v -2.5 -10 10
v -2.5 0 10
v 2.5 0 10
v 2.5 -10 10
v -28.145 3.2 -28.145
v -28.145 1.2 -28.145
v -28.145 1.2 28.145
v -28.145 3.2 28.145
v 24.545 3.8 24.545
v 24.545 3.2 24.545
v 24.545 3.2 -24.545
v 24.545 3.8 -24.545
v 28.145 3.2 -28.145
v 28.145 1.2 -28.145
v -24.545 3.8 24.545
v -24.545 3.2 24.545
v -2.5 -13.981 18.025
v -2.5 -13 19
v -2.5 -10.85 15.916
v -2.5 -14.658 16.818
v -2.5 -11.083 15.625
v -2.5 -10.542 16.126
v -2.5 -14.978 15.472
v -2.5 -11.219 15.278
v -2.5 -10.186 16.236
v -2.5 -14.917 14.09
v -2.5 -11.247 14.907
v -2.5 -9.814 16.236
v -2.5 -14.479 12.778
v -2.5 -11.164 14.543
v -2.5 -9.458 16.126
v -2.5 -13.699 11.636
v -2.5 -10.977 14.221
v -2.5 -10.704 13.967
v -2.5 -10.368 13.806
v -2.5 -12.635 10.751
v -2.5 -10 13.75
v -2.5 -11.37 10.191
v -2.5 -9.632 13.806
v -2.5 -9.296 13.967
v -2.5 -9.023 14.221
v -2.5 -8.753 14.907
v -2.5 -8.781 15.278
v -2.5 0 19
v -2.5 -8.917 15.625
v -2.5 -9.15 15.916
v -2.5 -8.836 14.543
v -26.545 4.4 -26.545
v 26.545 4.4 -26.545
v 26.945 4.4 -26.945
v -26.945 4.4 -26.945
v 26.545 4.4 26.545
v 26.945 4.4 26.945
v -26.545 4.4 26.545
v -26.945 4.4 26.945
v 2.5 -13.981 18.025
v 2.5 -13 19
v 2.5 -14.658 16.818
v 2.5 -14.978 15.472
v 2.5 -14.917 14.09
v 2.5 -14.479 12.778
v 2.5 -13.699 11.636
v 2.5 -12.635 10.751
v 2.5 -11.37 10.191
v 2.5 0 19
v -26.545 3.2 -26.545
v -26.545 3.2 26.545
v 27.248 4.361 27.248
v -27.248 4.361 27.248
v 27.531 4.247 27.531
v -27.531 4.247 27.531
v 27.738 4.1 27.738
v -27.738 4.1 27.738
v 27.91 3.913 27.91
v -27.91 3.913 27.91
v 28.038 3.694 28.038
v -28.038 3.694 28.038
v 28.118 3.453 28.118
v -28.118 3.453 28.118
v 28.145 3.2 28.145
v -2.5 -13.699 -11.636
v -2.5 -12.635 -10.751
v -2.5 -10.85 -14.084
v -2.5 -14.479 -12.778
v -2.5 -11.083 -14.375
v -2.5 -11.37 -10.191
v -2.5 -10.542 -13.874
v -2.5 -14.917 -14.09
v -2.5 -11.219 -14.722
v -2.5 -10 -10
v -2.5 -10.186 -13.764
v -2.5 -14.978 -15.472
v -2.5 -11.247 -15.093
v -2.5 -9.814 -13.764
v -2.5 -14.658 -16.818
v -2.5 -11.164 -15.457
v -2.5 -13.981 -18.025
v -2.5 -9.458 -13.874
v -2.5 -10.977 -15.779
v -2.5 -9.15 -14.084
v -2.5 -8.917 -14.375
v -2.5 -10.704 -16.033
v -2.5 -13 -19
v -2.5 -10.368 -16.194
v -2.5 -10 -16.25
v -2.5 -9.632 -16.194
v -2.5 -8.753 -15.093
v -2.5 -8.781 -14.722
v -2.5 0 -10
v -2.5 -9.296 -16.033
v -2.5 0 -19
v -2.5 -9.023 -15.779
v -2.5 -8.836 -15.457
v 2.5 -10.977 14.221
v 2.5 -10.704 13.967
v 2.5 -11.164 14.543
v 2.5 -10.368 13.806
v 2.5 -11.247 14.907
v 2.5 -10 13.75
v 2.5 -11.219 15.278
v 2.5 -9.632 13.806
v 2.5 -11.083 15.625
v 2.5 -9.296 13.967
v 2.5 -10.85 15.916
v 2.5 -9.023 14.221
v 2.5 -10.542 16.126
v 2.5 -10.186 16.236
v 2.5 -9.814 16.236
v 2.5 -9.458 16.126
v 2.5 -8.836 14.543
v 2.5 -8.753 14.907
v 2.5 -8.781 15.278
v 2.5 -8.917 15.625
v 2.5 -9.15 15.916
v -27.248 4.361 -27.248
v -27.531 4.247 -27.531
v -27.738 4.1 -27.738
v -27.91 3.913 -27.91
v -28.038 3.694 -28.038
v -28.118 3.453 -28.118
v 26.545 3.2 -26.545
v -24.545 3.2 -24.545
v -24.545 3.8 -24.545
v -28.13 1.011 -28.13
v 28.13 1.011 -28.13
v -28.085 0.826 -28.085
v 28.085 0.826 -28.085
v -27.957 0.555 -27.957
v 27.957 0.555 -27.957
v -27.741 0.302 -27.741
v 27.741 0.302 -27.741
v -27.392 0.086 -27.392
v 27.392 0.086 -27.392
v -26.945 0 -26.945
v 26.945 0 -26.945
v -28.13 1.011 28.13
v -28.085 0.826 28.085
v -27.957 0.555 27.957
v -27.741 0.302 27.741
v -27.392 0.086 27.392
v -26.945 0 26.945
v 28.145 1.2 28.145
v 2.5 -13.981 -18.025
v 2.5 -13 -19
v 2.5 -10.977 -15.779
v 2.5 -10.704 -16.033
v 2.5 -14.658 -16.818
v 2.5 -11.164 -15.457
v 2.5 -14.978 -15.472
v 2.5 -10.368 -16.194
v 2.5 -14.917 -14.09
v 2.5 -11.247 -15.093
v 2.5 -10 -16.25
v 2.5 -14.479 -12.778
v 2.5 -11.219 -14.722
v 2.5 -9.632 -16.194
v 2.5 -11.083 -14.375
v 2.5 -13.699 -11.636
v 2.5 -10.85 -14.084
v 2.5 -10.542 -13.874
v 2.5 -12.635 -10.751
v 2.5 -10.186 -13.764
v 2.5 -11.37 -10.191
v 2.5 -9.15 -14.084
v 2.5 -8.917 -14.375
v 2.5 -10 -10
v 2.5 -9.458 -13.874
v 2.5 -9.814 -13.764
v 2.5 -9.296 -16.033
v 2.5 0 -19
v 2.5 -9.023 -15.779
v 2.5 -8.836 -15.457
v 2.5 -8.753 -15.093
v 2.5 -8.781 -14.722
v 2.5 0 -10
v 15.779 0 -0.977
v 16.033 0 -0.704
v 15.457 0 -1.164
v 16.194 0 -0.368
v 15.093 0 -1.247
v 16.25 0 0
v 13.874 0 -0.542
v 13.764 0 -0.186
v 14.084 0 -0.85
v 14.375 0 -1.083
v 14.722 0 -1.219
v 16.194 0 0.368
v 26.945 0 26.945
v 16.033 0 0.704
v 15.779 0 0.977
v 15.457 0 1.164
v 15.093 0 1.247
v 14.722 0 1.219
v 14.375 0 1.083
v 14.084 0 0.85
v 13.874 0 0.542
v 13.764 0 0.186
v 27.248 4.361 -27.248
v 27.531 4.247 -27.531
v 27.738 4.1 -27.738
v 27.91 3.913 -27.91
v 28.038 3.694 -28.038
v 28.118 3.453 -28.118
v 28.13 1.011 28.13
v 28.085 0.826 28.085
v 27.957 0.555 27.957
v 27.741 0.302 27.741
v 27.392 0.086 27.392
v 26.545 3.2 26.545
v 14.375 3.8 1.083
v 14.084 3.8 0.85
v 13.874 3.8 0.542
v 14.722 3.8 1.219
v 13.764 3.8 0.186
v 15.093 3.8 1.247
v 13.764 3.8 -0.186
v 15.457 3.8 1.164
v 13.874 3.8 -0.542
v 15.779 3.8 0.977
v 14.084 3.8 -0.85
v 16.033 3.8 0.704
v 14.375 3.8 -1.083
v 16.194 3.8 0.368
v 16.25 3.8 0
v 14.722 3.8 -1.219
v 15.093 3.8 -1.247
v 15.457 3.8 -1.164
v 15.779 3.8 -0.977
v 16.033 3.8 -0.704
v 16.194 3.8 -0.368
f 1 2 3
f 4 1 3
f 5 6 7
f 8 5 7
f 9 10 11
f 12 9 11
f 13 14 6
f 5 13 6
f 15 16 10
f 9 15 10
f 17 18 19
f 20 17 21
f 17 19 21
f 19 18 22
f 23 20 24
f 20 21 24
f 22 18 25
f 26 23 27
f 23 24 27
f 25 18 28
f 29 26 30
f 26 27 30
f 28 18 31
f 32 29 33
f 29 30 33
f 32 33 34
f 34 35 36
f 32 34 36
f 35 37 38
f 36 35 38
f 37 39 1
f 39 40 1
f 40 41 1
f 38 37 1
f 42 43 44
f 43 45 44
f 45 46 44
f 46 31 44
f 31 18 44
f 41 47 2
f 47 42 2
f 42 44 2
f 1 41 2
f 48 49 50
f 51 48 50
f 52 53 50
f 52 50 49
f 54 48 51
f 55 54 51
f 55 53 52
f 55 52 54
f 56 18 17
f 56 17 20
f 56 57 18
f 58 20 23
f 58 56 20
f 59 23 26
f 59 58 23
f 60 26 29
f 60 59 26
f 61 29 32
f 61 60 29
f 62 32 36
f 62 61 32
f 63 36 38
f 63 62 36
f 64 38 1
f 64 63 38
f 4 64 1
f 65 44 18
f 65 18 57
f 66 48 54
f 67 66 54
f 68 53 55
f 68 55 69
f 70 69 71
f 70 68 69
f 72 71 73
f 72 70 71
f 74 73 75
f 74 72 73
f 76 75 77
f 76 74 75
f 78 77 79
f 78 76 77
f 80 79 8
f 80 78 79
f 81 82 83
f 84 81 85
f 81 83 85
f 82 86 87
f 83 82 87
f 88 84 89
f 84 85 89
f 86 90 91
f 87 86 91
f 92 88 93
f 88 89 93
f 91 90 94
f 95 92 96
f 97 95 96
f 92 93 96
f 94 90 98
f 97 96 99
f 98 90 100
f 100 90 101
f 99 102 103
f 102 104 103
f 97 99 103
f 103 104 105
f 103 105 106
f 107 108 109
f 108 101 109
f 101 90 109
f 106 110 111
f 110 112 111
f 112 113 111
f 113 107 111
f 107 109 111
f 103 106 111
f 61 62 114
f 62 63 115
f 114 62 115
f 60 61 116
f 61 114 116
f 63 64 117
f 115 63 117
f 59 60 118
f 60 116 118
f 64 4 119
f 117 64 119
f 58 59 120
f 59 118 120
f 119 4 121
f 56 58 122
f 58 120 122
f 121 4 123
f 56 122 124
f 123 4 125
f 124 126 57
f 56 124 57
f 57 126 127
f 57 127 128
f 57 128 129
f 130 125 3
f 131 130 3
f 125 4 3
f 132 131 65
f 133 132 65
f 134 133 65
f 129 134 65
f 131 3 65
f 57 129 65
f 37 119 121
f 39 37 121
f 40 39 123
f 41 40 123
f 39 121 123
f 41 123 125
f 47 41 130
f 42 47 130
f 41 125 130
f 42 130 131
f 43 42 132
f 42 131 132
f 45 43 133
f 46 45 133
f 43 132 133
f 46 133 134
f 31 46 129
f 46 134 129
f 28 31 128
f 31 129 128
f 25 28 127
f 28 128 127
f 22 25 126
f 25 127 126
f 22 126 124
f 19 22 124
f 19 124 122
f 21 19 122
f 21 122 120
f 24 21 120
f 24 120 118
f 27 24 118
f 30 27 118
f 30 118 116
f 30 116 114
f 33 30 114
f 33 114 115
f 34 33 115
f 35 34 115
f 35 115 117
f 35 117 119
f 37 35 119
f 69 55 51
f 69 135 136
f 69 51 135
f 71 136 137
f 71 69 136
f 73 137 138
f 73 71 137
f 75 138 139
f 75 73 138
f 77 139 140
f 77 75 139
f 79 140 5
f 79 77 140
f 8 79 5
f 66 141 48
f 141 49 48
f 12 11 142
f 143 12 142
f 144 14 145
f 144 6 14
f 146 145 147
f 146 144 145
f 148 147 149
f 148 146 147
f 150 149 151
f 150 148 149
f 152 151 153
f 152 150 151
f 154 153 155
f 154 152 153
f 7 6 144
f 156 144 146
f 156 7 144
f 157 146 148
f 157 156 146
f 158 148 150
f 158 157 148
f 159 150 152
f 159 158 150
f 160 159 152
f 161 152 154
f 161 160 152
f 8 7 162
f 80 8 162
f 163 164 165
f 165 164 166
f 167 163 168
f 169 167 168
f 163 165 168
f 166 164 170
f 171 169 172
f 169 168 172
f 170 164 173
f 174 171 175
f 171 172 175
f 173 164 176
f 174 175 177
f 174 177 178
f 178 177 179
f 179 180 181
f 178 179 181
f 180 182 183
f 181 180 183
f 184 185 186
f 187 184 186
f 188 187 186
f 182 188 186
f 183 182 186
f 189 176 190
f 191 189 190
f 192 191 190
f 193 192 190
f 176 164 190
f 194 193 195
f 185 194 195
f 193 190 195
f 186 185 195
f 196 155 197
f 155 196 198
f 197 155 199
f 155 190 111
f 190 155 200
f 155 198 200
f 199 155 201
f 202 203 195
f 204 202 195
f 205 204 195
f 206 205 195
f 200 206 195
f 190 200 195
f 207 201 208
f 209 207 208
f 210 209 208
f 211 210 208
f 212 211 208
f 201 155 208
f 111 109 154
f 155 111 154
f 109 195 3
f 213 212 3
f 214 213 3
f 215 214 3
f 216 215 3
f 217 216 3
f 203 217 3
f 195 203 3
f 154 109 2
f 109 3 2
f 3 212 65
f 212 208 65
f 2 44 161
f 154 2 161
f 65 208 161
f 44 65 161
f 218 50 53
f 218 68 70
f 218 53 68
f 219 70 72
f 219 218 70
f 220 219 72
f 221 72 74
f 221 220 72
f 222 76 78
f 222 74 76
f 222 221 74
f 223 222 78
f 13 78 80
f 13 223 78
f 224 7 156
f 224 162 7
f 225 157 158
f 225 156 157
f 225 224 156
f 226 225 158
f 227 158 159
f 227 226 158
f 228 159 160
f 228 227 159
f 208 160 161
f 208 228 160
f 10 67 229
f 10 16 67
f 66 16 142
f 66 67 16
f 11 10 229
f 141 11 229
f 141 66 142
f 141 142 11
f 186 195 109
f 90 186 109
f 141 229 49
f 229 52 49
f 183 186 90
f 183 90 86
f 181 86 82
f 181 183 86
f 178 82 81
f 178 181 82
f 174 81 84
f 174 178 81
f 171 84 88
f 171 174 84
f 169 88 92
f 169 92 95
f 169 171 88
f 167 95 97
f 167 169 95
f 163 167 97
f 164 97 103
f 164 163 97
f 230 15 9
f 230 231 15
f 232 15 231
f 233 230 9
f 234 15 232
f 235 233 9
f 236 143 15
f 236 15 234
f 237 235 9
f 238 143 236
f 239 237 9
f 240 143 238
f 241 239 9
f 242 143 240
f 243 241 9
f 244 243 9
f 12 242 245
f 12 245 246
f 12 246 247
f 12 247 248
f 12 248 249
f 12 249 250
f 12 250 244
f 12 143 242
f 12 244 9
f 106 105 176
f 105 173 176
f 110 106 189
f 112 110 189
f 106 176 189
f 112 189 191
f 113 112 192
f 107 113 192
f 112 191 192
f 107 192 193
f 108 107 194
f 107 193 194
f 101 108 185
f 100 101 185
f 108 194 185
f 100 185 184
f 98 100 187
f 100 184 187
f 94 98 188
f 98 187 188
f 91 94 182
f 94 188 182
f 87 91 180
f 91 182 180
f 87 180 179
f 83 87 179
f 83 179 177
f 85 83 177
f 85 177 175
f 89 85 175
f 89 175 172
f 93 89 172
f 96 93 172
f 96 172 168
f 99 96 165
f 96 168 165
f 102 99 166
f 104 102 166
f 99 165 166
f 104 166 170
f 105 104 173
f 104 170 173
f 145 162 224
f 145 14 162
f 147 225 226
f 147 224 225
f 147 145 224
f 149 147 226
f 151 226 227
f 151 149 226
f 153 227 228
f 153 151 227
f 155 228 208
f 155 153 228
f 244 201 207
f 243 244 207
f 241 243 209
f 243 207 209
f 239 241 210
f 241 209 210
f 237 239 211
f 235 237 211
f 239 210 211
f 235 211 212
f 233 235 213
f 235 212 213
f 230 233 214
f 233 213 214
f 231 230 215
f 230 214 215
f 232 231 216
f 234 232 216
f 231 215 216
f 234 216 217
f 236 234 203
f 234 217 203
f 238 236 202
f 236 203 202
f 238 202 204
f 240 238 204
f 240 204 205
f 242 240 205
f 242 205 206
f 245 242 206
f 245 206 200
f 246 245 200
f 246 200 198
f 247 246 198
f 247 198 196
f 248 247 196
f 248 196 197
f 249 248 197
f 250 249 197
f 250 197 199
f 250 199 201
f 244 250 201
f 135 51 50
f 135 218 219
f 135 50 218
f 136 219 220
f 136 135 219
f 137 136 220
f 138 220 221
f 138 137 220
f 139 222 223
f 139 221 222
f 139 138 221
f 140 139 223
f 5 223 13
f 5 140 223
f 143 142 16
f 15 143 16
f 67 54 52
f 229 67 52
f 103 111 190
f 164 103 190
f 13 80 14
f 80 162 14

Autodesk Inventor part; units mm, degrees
ref_plane "YZ Plane" through (0, 0, 0) normal (1, 0, 0) x (0, 1, 0)
ref_plane "XZ Plane" through (0, 0, 0) normal (0, 1, 0) x (-1, 0, 0)
ref_plane "XY Plane" through (0, 0, 0) normal (0, 0, 1) x (1, 0, 0)
sketch "스케치1" plane through (0, 0, 0) normal (0, 1, 0) x (-1, 0, 0)
  line L0 (-24.9446, -24.9446) -> (24.9446, -24.9446)
  line L1 (24.9446, -24.9446) -> (24.9446, 24.9446)
  line L2 (24.9446, 24.9446) -> (-24.9446, 24.9446)
  line L3 (-24.9446, 24.9446) -> (-24.9446, -24.9446)
  line L4 (-24.9446, -24.9446) -> (24.9446, 24.9446) construction
  line L5 (24.9446, -24.9446) -> (-24.9446, 24.9446) construction
  line L6 (-28.1446, -28.1446) -> (28.1446, -28.1446)
  line L7 (28.1446, -28.1446) -> (28.1446, 28.1446)
  line L8 (28.1446, 28.1446) -> (-28.1446, 28.1446)
  line L9 (-28.1446, 28.1446) -> (-28.1446, -28.1446)
  line L10 (-28.1446, -28.1446) -> (28.1446, 28.1446) construction
  line L11 (28.1446, -28.1446) -> (-28.1446, 28.1446) construction
  point P0 (0, 0)
  dimension "d0" = 70.554
  dimension "d1" = 3.2
extrude "돌출1" add sketch "스케치1" along normal blind 4.4 contours L3 L2 L1 L0 | L9 L8 L7 L6
sketch "스케치2" plane through (0, 4.4, 0) normal (0, 1, 0) x (1, 0, 0)
  line L0 (-28.1446, 28.1446) -> (-28.1446, -28.1446) projected
  line L1 (-28.1446, -28.1446) -> (28.1446, -28.1446) projected
  line L2 (28.1446, -28.1446) -> (28.1446, 28.1446) projected
  line L3 (28.1446, 28.1446) -> (-28.1446, 28.1446) projected
  line L4 (26.5446, 26.5446) -> (-26.5446, 26.5446)
  line L5 (-26.5446, 26.5446) -> (-26.5446, -26.5446)
  line L6 (-26.5446, -26.5446) -> (26.5446, -26.5446)
  line L7 (26.5446, -26.5446) -> (26.5446, 26.5446)
  line L8 (26.5446, 26.5446) -> (-26.5446, -26.5446) construction
  line L9 (-26.5446, 26.5446) -> (26.5446, -26.5446) construction
  line L10 (24.5446, 24.5446) -> (-24.5446, 24.5446)
  line L11 (-24.5446, 24.5446) -> (-24.5446, -24.5446)
  line L12 (-24.5446, -24.5446) -> (24.5446, -24.5446)
  line L13 (24.5446, -24.5446) -> (24.5446, 24.5446)
  line L14 (24.5446, 24.5446) -> (-24.5446, -24.5446) construction
  line L15 (-24.5446, 24.5446) -> (24.5446, -24.5446) construction
  point P0 (0, 0)
  point P1 (0, 28.1446)
  point P2 (-28.1446, 0)
  dimension "d4" = 1.6
  dimension "d5" = 2
extrude "돌출2" cut sketch "스케치2" against normal blind 1.2 contours L7 L6 L5 L4 | L13 L12 L11 L10
sketch "스케치3" plane through (0, 3.2, 0) normal (0, 1, 0) x (1, 0, 0)
  line L0 (24.5446, 24.5446) -> (-24.5446, 24.5446)
  line L1 (-24.5446, 24.5446) -> (-24.5446, -24.5446)
  line L2 (-24.5446, -24.5446) -> (24.5446, -24.5446)
  line L3 (24.5446, -24.5446) -> (24.5446, 24.5446)
  line L4 (24.5446, 24.5446) -> (-24.5446, -24.5446) construction
  line L5 (-24.5446, 24.5446) -> (24.5446, -24.5446) construction
  line L6 (-26.5446, -26.5446) -> (-26.5446, 26.5446) projected
  point P0 (0, 0)
  dimension "d8" = 2
extrude "돌출3" add sketch "스케치3" along normal blind 0.6
fillet "모깎기1" radius 1.2 8 edges at (0, 4.4, 28.1446) (28.1446, 4.4, 0) (0, 4.4, -28.1446) (-28.1446, 4.4, 0) (-28.1446, 0, 0) (0, 0, 28.1446) (28.1446, 0, 0) (0, 0, -28.1446)
sketch "스케치6" plane through (0, 0, 0) normal (0, -1, 0) x (1, 0, 0)
  line L0 (-2.5, -20) -> (2.5, -20)
  line L1 (2.5, -20) -> (2.5, -10)
  line L2 (2.5, -10) -> (-2.5, -10)
  line L3 (-2.5, -10) -> (-2.5, -20)
  line L4 (-2.5, -20) -> (2.5, -10) construction
  line L5 (2.5, -20) -> (-2.5, -10) construction
  line L6 (-2.5, 10) -> (2.5, 10)
  line L7 (2.5, 10) -> (2.5, 20)
  line L8 (2.5, 20) -> (-2.5, 20)
  line L9 (-2.5, 20) -> (-2.5, 10)
  line L10 (-2.5, 10) -> (2.5, 20) construction
  line L11 (2.5, 10) -> (-2.5, 20) construction
  point P0 (0, 0)
  point P1 (0, -15)
  point P2 (0, 15)
  dimension "d27" = 5
  dimension "d28" = 10
  dimension "d29" = 10
  dimension "d30" = 5
  dimension "d31" = 20
  dimension "d33" = 10
extrude "돌출6" add sketch "스케치6" along normal blind 10
sketch "스케치7" plane through (2.5, 0, 20) normal (1, 0, 0) x (0, 0, -1)
  line L0 (10, -10) -> (0, -10) projected
  circle A0 centre (5, -10) radius 5
  line L1 (40, -10) -> (30, -10) projected
  circle A1 centre (35, -10) radius 5
  point P0 (20, 0)
extrude "돌출7" add sketch "스케치7" against normal blind 5
sketch "스케치8" plane through (2.5, 0, 20) normal (1, 0, 0) x (0, 0, -1)
  arc A0 (0, -10) -> (10, -10) centre (5, -10) ccw projected
  circle A1 centre (5, -10) radius 1.25
  arc A2 (30, -10) -> (40, -10) centre (35, -10) ccw projected
  circle A3 centre (35, -10) radius 1.25
  point P0 (20, 0)
  dimension "d38" = 2.5
  dimension "d39" = 2.5
extrude "돌출8" cut sketch "스케치8" against normal blind 5
sketch "스케치9" plane through (0, 0, 0) normal (0, -1, 0) x (1, 0, 0)
  line L0 (2.5, -10) -> (-2.5, -10) projected
  line L1 (-2.5, -20) -> (-2.5, -10) projected
  line L2 (-2.5, -20) -> (2.5, -20) projected
  line L3 (2.5, -10) -> (2.5, -20) projected
  line L4 (2.5, 13.75) -> (-2.5, 13.75) projected
  line L5 (2.5, 20) -> (-2.5, 20) projected
  line L6 (-2.5, 10) -> (-2.5, 20) projected
  line L7 (-2.5, 10) -> (2.5, 10) projected
  line L8 (2.5, 20) -> (2.5, 10) projected
  line L9 (-2.5, -19) -> (2.5, -19)
  line L10 (-2.5, 10) -> (-2.5, 20) projected
  line L11 (-2.5, 19) -> (2.5, 19)
  point P0 (0, 0)
  dimension "d42" = 1
  dimension "d43" = 1
extrude "돌출9" cut sketch "스케치9" along normal blind 15 contours L3 L2 L1 L9 | L11 L6 L5 L8
sketch "스케치10" plane through (0, 0, 0) normal (0, -1, 0) x (1, 0, 0)
  circle A0 centre (15, 0) radius 1.25
  point P0 (0, 0)
  dimension "d46" = 2.5
  dimension "d47" = 15
extrude "돌출10" cut sketch "스케치10" against normal blind 10
equation "\"d33\" = 0.5 * d31"
properties part number "OV-PAM_n_4_bottom"
